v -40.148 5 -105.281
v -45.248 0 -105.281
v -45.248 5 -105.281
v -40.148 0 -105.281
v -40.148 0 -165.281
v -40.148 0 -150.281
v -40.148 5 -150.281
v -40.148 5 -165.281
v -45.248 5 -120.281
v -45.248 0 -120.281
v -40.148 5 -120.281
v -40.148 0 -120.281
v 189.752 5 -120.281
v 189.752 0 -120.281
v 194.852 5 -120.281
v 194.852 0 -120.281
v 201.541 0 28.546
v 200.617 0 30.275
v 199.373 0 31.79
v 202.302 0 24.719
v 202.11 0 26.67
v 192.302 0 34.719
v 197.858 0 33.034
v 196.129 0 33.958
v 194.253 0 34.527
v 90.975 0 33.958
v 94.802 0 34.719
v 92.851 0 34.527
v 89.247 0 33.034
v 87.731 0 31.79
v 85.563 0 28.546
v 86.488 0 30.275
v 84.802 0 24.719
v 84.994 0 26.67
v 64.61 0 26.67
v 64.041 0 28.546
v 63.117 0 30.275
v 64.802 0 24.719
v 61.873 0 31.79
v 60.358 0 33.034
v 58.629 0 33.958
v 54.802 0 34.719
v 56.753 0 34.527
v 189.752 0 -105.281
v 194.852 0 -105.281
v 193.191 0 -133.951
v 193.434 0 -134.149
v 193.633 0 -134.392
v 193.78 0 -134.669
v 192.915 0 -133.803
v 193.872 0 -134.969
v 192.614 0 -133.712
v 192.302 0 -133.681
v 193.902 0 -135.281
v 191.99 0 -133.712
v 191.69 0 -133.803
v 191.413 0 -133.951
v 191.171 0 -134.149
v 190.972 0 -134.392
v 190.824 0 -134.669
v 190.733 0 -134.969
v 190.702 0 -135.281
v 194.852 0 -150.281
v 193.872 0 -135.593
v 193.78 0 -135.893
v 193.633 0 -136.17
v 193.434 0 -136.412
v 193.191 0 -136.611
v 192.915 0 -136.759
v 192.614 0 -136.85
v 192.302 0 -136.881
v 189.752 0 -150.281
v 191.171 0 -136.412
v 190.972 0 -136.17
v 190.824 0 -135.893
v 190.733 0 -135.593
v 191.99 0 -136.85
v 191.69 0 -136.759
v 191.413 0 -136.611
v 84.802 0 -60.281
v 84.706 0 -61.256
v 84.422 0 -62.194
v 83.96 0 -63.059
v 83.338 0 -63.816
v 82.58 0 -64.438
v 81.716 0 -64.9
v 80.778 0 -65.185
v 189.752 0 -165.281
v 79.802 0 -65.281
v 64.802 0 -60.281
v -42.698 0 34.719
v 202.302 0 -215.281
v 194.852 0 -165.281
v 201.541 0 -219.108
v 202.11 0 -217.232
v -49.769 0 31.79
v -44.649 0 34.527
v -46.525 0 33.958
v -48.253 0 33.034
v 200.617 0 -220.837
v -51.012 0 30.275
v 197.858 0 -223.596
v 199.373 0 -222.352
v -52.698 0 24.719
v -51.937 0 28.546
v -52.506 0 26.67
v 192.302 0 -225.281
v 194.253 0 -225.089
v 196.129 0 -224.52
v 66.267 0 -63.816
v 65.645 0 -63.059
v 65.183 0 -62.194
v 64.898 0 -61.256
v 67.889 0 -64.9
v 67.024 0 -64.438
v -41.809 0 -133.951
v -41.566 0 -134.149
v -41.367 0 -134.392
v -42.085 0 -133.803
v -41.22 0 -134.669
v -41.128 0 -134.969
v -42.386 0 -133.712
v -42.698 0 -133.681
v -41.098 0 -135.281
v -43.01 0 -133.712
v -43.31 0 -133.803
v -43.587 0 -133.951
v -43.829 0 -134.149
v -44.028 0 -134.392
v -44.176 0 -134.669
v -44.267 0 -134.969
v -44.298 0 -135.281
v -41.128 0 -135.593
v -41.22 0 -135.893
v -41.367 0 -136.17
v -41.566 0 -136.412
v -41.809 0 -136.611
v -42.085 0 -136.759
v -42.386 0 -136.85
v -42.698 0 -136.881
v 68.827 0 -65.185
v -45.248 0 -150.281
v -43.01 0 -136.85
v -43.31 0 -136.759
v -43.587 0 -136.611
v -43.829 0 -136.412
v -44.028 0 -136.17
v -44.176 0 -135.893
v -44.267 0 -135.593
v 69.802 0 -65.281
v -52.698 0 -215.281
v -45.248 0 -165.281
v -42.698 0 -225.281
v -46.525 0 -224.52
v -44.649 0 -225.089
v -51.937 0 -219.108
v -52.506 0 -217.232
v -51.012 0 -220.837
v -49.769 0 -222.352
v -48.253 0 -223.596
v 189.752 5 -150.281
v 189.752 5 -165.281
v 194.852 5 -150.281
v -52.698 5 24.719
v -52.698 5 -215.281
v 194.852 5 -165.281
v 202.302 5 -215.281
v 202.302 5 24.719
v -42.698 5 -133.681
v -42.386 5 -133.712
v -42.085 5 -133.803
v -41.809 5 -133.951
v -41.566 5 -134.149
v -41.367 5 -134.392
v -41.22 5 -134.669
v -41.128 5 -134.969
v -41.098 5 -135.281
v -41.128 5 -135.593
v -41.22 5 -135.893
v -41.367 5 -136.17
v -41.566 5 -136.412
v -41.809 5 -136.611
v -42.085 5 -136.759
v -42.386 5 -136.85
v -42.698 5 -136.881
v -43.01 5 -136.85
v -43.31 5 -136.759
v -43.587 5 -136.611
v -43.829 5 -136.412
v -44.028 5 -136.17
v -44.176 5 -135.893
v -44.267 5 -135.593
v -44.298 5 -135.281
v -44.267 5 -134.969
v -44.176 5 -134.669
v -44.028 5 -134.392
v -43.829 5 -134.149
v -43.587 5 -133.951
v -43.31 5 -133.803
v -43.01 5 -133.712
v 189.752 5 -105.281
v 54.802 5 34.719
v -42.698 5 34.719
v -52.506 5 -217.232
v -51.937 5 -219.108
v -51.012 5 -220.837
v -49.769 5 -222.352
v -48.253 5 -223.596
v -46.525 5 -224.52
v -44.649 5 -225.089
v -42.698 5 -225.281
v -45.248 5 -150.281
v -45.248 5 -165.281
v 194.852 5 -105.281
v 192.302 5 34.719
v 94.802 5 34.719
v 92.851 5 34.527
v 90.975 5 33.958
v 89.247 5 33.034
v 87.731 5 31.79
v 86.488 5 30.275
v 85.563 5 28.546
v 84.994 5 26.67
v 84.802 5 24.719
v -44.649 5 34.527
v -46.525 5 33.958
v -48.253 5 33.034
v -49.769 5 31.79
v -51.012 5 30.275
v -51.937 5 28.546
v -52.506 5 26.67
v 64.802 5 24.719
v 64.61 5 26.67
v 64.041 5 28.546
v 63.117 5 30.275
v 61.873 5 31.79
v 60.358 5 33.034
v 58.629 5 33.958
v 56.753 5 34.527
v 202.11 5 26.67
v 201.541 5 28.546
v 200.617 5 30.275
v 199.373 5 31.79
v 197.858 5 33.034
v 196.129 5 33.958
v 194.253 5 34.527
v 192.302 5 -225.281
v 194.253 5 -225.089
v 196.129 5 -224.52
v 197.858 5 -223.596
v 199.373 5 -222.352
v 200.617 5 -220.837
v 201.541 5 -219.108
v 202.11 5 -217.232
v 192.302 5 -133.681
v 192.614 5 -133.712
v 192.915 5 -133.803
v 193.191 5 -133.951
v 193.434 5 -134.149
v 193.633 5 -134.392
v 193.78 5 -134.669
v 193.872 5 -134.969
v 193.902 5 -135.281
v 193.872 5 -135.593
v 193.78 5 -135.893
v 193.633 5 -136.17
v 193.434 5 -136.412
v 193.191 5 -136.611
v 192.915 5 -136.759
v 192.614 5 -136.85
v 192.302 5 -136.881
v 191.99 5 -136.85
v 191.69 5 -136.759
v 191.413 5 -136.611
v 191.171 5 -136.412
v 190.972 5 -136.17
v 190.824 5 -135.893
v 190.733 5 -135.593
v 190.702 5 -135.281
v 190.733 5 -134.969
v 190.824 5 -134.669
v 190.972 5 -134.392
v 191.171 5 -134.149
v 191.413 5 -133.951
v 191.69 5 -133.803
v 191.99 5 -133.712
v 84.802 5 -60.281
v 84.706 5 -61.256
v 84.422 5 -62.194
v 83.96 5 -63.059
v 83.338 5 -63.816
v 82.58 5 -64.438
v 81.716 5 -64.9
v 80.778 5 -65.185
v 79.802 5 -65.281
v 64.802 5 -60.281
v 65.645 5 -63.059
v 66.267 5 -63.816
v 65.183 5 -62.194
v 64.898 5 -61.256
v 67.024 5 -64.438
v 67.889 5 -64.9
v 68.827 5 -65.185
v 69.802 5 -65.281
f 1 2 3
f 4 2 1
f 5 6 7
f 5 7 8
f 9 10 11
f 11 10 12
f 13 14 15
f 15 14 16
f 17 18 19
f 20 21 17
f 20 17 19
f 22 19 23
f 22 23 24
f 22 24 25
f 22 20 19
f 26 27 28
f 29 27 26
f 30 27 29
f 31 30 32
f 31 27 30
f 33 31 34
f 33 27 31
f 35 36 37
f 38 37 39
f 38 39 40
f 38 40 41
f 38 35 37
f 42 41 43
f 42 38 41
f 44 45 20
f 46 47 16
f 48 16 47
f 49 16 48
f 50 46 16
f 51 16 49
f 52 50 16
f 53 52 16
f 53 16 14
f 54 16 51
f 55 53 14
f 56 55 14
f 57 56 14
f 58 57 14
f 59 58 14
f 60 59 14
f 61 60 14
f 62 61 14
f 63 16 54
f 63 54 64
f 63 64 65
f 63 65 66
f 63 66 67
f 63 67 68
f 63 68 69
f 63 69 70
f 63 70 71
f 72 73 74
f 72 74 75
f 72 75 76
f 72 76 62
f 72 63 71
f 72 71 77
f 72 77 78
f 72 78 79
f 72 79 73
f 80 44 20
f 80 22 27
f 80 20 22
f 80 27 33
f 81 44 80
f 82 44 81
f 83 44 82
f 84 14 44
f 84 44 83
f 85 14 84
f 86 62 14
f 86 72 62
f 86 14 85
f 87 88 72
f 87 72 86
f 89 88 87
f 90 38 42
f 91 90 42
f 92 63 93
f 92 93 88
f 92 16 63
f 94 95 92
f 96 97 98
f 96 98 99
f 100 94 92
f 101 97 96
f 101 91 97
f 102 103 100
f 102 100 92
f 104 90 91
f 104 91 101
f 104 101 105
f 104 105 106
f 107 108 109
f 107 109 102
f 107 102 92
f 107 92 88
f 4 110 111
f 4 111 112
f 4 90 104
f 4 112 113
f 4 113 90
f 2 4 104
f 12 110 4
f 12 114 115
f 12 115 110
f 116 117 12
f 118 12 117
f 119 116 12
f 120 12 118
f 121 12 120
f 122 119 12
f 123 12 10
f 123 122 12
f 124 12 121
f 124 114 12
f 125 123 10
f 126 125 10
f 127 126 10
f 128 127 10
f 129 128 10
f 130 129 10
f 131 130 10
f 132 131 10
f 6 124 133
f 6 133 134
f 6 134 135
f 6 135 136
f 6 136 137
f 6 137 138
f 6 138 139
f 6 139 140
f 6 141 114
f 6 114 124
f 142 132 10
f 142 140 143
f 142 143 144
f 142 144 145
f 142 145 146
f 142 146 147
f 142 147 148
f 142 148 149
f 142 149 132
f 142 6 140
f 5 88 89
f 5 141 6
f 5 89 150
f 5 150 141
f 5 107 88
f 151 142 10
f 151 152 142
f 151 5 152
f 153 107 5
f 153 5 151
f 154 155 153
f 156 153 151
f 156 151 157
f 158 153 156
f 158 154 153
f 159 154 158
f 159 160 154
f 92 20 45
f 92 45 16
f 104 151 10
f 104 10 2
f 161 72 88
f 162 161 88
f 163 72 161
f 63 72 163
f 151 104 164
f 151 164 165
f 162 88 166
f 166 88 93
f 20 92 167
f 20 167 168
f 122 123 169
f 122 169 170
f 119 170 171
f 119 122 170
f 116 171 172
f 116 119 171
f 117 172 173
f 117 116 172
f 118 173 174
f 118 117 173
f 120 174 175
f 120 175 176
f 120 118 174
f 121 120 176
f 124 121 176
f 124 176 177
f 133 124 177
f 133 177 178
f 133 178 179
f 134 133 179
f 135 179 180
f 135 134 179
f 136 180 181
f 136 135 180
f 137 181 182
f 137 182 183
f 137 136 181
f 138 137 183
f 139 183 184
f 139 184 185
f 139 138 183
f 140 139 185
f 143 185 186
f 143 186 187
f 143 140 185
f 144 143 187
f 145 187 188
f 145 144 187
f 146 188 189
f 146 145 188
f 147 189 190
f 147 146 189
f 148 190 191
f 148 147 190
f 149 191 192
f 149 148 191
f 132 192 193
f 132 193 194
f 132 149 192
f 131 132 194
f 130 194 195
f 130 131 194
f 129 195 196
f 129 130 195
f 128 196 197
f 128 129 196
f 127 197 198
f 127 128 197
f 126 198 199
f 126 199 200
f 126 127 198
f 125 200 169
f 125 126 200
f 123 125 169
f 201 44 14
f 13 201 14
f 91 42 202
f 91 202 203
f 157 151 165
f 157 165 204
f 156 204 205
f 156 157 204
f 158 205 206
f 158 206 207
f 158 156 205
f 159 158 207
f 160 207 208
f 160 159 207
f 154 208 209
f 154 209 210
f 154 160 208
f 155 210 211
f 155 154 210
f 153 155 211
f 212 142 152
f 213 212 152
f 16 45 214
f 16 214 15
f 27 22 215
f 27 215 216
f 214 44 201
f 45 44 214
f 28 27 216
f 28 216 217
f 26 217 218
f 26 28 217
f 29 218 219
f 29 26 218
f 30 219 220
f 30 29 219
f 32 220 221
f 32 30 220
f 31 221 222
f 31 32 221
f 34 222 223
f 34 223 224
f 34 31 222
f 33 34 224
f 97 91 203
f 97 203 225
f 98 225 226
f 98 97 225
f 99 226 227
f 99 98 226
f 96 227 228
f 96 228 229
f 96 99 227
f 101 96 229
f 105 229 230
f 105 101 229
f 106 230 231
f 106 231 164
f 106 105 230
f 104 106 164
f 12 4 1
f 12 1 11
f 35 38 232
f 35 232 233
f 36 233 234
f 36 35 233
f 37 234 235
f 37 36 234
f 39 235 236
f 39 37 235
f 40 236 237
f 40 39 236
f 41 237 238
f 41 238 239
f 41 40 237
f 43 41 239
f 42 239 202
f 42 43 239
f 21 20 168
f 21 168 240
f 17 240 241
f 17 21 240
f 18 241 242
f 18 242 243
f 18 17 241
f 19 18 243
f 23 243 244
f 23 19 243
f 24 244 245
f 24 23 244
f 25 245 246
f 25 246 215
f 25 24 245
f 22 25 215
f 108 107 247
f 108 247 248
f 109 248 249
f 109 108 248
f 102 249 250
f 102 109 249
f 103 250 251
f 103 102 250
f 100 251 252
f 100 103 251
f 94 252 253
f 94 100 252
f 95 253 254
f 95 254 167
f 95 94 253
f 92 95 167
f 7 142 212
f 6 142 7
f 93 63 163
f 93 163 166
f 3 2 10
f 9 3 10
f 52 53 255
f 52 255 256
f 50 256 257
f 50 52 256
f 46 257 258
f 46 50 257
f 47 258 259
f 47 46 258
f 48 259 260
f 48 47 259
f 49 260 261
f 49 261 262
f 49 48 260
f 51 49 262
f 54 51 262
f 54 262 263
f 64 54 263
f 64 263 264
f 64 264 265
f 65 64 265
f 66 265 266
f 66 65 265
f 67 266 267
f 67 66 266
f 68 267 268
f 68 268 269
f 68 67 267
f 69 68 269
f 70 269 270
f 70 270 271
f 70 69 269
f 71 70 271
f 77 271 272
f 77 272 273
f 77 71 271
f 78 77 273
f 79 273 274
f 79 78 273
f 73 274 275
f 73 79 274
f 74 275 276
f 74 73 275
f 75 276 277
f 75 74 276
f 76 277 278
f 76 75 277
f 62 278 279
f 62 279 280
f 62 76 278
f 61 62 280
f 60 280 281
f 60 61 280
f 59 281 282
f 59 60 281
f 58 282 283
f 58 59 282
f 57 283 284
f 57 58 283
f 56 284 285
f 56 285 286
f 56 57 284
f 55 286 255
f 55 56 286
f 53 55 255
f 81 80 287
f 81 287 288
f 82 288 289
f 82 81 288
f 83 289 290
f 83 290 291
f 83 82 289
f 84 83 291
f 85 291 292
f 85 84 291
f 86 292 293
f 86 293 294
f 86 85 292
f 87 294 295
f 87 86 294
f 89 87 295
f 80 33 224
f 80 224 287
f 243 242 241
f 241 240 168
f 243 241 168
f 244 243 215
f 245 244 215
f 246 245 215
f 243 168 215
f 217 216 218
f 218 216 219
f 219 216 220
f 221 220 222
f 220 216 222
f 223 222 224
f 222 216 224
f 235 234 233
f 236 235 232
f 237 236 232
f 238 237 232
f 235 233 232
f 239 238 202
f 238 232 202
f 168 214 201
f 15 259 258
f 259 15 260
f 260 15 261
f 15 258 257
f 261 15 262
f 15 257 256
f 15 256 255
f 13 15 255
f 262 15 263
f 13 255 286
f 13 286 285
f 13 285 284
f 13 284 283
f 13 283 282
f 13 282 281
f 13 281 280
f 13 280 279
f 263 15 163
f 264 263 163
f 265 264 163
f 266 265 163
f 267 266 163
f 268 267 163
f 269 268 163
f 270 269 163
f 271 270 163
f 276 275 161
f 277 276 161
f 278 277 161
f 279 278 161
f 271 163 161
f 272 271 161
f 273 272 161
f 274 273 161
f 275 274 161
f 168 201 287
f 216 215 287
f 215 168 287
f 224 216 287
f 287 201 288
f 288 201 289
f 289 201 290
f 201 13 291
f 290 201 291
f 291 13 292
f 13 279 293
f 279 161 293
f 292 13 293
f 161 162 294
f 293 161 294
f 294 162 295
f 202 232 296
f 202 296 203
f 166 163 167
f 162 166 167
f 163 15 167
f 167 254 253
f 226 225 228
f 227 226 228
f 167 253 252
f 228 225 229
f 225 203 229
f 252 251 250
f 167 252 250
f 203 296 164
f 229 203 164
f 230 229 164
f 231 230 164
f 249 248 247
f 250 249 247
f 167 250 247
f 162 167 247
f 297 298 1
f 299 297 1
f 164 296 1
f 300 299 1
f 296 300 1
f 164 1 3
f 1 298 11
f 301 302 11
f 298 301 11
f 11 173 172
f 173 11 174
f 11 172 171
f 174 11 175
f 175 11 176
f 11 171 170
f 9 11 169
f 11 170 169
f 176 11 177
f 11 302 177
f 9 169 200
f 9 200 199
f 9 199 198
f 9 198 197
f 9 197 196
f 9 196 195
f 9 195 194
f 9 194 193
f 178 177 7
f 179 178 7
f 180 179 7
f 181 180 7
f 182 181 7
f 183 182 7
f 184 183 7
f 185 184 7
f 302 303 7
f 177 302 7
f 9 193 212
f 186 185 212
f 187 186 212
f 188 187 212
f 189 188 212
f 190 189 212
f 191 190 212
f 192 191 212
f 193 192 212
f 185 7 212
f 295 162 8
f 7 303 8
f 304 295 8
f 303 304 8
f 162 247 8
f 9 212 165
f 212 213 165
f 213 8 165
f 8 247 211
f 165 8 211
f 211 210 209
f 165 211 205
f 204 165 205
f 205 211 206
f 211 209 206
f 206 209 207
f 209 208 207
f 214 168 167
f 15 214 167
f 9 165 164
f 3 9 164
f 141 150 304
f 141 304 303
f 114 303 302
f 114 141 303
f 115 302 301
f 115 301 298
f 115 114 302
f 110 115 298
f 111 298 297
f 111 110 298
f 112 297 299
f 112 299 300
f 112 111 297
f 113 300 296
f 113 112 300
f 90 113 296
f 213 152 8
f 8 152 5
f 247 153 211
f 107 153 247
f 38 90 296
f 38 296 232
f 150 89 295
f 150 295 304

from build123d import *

# Parameters (mm, degrees)
SKETCH1_R           = 1.6
SKETCH1_W           = 5.099999999
SKETCH1_H           = 15
SKETCH1_W_2         = 5.099999998
SKETCH1_W_3         = 5.1
BOSS_EXTRUDE1_DEPTH = 5


with BuildPart() as part:
    # Sketch1 → Boss-Extrude1 (new body)
    with BuildSketch(Plane(origin=(0, 0, 0), x_dir=(1, 0, 0), z_dir=(0, 1, 0))):
        with BuildLine():
            Line((-42.697719413, 225.280869355), (192.302280587, 225.280869355))
            ThreePointArc((192.302280587, 225.280869355), (199.373348399, 222.351937167), (202.302280587, 215.280869355))
            Line((202.302280587, 215.280869355), (202.302280587, -24.719130645))
            ThreePointArc((202.302280587, -24.719130645), (199.373348399, -31.790198457), (192.302280587, -34.719130645))
            Line((192.302280587, -34.719130645), (94.802280587, -34.719130645))
            ThreePointArc((94.802280587, -34.719130645), (87.731212775, -31.790198457), (84.802280587, -24.719130645))
            Line((84.802280587, -24.719130645), (84.802280587, 60.280869355))
            ThreePointArc((84.802280587, 60.280869355), (83.337814493, 63.816403261), (79.802280587, 65.280869355))
            Line((79.802280587, 65.280869355), (69.802280587, 65.280869355))
            ThreePointArc((69.802280587, 65.280869355), (66.266746681, 63.816403261), (64.802280587, 60.280869355))
            Line((64.802280587, 60.280869355), (64.802280587, -24.719130645))
            ThreePointArc((64.802280587, -24.719130645), (61.873348399, -31.790198457), (54.802280587, -34.719130645))
            Line((54.802280587, -34.719130645), (-42.697719413, -34.719130645))
            ThreePointArc((-42.697719413, -34.719130645), (-49.768787225, -31.790198457), (-52.697719413, -24.719130645))
            Line((-52.697719413, -24.719130645), (-52.697719413, 215.280869355))
            ThreePointArc((-52.697719413, 215.280869355), (-49.768787225, 222.351937167), (-42.697719413, 225.280869355))
        make_face()
        with Locations(Location((192.302280587, 135.280869355, 0), (0, 0, 270))):
            Circle(SKETCH1_R, mode=Mode.SUBTRACT)
        with Locations(Location((-42.697719413, 135.280869355, 0), (0, 0, 270))):
            Circle(SKETCH1_R, mode=Mode.SUBTRACT)
        with Locations((192.302280588, 157.780869355)):
            Rectangle(SKETCH1_W, SKETCH1_H, mode=Mode.SUBTRACT)
        with Locations((192.302280587, 112.780869355)):
            Rectangle(SKETCH1_W_2, SKETCH1_H, mode=Mode.SUBTRACT)
        with Locations((-42.697719413, 157.780869355)):
            Rectangle(SKETCH1_W_3, SKETCH1_H, mode=Mode.SUBTRACT)
        with Locations((-42.697719413, 112.780869355)):
            Rectangle(SKETCH1_W_3, SKETCH1_H, mode=Mode.SUBTRACT)
    extrude(amount=BOSS_EXTRUDE1_DEPTH)


solid = part.part
